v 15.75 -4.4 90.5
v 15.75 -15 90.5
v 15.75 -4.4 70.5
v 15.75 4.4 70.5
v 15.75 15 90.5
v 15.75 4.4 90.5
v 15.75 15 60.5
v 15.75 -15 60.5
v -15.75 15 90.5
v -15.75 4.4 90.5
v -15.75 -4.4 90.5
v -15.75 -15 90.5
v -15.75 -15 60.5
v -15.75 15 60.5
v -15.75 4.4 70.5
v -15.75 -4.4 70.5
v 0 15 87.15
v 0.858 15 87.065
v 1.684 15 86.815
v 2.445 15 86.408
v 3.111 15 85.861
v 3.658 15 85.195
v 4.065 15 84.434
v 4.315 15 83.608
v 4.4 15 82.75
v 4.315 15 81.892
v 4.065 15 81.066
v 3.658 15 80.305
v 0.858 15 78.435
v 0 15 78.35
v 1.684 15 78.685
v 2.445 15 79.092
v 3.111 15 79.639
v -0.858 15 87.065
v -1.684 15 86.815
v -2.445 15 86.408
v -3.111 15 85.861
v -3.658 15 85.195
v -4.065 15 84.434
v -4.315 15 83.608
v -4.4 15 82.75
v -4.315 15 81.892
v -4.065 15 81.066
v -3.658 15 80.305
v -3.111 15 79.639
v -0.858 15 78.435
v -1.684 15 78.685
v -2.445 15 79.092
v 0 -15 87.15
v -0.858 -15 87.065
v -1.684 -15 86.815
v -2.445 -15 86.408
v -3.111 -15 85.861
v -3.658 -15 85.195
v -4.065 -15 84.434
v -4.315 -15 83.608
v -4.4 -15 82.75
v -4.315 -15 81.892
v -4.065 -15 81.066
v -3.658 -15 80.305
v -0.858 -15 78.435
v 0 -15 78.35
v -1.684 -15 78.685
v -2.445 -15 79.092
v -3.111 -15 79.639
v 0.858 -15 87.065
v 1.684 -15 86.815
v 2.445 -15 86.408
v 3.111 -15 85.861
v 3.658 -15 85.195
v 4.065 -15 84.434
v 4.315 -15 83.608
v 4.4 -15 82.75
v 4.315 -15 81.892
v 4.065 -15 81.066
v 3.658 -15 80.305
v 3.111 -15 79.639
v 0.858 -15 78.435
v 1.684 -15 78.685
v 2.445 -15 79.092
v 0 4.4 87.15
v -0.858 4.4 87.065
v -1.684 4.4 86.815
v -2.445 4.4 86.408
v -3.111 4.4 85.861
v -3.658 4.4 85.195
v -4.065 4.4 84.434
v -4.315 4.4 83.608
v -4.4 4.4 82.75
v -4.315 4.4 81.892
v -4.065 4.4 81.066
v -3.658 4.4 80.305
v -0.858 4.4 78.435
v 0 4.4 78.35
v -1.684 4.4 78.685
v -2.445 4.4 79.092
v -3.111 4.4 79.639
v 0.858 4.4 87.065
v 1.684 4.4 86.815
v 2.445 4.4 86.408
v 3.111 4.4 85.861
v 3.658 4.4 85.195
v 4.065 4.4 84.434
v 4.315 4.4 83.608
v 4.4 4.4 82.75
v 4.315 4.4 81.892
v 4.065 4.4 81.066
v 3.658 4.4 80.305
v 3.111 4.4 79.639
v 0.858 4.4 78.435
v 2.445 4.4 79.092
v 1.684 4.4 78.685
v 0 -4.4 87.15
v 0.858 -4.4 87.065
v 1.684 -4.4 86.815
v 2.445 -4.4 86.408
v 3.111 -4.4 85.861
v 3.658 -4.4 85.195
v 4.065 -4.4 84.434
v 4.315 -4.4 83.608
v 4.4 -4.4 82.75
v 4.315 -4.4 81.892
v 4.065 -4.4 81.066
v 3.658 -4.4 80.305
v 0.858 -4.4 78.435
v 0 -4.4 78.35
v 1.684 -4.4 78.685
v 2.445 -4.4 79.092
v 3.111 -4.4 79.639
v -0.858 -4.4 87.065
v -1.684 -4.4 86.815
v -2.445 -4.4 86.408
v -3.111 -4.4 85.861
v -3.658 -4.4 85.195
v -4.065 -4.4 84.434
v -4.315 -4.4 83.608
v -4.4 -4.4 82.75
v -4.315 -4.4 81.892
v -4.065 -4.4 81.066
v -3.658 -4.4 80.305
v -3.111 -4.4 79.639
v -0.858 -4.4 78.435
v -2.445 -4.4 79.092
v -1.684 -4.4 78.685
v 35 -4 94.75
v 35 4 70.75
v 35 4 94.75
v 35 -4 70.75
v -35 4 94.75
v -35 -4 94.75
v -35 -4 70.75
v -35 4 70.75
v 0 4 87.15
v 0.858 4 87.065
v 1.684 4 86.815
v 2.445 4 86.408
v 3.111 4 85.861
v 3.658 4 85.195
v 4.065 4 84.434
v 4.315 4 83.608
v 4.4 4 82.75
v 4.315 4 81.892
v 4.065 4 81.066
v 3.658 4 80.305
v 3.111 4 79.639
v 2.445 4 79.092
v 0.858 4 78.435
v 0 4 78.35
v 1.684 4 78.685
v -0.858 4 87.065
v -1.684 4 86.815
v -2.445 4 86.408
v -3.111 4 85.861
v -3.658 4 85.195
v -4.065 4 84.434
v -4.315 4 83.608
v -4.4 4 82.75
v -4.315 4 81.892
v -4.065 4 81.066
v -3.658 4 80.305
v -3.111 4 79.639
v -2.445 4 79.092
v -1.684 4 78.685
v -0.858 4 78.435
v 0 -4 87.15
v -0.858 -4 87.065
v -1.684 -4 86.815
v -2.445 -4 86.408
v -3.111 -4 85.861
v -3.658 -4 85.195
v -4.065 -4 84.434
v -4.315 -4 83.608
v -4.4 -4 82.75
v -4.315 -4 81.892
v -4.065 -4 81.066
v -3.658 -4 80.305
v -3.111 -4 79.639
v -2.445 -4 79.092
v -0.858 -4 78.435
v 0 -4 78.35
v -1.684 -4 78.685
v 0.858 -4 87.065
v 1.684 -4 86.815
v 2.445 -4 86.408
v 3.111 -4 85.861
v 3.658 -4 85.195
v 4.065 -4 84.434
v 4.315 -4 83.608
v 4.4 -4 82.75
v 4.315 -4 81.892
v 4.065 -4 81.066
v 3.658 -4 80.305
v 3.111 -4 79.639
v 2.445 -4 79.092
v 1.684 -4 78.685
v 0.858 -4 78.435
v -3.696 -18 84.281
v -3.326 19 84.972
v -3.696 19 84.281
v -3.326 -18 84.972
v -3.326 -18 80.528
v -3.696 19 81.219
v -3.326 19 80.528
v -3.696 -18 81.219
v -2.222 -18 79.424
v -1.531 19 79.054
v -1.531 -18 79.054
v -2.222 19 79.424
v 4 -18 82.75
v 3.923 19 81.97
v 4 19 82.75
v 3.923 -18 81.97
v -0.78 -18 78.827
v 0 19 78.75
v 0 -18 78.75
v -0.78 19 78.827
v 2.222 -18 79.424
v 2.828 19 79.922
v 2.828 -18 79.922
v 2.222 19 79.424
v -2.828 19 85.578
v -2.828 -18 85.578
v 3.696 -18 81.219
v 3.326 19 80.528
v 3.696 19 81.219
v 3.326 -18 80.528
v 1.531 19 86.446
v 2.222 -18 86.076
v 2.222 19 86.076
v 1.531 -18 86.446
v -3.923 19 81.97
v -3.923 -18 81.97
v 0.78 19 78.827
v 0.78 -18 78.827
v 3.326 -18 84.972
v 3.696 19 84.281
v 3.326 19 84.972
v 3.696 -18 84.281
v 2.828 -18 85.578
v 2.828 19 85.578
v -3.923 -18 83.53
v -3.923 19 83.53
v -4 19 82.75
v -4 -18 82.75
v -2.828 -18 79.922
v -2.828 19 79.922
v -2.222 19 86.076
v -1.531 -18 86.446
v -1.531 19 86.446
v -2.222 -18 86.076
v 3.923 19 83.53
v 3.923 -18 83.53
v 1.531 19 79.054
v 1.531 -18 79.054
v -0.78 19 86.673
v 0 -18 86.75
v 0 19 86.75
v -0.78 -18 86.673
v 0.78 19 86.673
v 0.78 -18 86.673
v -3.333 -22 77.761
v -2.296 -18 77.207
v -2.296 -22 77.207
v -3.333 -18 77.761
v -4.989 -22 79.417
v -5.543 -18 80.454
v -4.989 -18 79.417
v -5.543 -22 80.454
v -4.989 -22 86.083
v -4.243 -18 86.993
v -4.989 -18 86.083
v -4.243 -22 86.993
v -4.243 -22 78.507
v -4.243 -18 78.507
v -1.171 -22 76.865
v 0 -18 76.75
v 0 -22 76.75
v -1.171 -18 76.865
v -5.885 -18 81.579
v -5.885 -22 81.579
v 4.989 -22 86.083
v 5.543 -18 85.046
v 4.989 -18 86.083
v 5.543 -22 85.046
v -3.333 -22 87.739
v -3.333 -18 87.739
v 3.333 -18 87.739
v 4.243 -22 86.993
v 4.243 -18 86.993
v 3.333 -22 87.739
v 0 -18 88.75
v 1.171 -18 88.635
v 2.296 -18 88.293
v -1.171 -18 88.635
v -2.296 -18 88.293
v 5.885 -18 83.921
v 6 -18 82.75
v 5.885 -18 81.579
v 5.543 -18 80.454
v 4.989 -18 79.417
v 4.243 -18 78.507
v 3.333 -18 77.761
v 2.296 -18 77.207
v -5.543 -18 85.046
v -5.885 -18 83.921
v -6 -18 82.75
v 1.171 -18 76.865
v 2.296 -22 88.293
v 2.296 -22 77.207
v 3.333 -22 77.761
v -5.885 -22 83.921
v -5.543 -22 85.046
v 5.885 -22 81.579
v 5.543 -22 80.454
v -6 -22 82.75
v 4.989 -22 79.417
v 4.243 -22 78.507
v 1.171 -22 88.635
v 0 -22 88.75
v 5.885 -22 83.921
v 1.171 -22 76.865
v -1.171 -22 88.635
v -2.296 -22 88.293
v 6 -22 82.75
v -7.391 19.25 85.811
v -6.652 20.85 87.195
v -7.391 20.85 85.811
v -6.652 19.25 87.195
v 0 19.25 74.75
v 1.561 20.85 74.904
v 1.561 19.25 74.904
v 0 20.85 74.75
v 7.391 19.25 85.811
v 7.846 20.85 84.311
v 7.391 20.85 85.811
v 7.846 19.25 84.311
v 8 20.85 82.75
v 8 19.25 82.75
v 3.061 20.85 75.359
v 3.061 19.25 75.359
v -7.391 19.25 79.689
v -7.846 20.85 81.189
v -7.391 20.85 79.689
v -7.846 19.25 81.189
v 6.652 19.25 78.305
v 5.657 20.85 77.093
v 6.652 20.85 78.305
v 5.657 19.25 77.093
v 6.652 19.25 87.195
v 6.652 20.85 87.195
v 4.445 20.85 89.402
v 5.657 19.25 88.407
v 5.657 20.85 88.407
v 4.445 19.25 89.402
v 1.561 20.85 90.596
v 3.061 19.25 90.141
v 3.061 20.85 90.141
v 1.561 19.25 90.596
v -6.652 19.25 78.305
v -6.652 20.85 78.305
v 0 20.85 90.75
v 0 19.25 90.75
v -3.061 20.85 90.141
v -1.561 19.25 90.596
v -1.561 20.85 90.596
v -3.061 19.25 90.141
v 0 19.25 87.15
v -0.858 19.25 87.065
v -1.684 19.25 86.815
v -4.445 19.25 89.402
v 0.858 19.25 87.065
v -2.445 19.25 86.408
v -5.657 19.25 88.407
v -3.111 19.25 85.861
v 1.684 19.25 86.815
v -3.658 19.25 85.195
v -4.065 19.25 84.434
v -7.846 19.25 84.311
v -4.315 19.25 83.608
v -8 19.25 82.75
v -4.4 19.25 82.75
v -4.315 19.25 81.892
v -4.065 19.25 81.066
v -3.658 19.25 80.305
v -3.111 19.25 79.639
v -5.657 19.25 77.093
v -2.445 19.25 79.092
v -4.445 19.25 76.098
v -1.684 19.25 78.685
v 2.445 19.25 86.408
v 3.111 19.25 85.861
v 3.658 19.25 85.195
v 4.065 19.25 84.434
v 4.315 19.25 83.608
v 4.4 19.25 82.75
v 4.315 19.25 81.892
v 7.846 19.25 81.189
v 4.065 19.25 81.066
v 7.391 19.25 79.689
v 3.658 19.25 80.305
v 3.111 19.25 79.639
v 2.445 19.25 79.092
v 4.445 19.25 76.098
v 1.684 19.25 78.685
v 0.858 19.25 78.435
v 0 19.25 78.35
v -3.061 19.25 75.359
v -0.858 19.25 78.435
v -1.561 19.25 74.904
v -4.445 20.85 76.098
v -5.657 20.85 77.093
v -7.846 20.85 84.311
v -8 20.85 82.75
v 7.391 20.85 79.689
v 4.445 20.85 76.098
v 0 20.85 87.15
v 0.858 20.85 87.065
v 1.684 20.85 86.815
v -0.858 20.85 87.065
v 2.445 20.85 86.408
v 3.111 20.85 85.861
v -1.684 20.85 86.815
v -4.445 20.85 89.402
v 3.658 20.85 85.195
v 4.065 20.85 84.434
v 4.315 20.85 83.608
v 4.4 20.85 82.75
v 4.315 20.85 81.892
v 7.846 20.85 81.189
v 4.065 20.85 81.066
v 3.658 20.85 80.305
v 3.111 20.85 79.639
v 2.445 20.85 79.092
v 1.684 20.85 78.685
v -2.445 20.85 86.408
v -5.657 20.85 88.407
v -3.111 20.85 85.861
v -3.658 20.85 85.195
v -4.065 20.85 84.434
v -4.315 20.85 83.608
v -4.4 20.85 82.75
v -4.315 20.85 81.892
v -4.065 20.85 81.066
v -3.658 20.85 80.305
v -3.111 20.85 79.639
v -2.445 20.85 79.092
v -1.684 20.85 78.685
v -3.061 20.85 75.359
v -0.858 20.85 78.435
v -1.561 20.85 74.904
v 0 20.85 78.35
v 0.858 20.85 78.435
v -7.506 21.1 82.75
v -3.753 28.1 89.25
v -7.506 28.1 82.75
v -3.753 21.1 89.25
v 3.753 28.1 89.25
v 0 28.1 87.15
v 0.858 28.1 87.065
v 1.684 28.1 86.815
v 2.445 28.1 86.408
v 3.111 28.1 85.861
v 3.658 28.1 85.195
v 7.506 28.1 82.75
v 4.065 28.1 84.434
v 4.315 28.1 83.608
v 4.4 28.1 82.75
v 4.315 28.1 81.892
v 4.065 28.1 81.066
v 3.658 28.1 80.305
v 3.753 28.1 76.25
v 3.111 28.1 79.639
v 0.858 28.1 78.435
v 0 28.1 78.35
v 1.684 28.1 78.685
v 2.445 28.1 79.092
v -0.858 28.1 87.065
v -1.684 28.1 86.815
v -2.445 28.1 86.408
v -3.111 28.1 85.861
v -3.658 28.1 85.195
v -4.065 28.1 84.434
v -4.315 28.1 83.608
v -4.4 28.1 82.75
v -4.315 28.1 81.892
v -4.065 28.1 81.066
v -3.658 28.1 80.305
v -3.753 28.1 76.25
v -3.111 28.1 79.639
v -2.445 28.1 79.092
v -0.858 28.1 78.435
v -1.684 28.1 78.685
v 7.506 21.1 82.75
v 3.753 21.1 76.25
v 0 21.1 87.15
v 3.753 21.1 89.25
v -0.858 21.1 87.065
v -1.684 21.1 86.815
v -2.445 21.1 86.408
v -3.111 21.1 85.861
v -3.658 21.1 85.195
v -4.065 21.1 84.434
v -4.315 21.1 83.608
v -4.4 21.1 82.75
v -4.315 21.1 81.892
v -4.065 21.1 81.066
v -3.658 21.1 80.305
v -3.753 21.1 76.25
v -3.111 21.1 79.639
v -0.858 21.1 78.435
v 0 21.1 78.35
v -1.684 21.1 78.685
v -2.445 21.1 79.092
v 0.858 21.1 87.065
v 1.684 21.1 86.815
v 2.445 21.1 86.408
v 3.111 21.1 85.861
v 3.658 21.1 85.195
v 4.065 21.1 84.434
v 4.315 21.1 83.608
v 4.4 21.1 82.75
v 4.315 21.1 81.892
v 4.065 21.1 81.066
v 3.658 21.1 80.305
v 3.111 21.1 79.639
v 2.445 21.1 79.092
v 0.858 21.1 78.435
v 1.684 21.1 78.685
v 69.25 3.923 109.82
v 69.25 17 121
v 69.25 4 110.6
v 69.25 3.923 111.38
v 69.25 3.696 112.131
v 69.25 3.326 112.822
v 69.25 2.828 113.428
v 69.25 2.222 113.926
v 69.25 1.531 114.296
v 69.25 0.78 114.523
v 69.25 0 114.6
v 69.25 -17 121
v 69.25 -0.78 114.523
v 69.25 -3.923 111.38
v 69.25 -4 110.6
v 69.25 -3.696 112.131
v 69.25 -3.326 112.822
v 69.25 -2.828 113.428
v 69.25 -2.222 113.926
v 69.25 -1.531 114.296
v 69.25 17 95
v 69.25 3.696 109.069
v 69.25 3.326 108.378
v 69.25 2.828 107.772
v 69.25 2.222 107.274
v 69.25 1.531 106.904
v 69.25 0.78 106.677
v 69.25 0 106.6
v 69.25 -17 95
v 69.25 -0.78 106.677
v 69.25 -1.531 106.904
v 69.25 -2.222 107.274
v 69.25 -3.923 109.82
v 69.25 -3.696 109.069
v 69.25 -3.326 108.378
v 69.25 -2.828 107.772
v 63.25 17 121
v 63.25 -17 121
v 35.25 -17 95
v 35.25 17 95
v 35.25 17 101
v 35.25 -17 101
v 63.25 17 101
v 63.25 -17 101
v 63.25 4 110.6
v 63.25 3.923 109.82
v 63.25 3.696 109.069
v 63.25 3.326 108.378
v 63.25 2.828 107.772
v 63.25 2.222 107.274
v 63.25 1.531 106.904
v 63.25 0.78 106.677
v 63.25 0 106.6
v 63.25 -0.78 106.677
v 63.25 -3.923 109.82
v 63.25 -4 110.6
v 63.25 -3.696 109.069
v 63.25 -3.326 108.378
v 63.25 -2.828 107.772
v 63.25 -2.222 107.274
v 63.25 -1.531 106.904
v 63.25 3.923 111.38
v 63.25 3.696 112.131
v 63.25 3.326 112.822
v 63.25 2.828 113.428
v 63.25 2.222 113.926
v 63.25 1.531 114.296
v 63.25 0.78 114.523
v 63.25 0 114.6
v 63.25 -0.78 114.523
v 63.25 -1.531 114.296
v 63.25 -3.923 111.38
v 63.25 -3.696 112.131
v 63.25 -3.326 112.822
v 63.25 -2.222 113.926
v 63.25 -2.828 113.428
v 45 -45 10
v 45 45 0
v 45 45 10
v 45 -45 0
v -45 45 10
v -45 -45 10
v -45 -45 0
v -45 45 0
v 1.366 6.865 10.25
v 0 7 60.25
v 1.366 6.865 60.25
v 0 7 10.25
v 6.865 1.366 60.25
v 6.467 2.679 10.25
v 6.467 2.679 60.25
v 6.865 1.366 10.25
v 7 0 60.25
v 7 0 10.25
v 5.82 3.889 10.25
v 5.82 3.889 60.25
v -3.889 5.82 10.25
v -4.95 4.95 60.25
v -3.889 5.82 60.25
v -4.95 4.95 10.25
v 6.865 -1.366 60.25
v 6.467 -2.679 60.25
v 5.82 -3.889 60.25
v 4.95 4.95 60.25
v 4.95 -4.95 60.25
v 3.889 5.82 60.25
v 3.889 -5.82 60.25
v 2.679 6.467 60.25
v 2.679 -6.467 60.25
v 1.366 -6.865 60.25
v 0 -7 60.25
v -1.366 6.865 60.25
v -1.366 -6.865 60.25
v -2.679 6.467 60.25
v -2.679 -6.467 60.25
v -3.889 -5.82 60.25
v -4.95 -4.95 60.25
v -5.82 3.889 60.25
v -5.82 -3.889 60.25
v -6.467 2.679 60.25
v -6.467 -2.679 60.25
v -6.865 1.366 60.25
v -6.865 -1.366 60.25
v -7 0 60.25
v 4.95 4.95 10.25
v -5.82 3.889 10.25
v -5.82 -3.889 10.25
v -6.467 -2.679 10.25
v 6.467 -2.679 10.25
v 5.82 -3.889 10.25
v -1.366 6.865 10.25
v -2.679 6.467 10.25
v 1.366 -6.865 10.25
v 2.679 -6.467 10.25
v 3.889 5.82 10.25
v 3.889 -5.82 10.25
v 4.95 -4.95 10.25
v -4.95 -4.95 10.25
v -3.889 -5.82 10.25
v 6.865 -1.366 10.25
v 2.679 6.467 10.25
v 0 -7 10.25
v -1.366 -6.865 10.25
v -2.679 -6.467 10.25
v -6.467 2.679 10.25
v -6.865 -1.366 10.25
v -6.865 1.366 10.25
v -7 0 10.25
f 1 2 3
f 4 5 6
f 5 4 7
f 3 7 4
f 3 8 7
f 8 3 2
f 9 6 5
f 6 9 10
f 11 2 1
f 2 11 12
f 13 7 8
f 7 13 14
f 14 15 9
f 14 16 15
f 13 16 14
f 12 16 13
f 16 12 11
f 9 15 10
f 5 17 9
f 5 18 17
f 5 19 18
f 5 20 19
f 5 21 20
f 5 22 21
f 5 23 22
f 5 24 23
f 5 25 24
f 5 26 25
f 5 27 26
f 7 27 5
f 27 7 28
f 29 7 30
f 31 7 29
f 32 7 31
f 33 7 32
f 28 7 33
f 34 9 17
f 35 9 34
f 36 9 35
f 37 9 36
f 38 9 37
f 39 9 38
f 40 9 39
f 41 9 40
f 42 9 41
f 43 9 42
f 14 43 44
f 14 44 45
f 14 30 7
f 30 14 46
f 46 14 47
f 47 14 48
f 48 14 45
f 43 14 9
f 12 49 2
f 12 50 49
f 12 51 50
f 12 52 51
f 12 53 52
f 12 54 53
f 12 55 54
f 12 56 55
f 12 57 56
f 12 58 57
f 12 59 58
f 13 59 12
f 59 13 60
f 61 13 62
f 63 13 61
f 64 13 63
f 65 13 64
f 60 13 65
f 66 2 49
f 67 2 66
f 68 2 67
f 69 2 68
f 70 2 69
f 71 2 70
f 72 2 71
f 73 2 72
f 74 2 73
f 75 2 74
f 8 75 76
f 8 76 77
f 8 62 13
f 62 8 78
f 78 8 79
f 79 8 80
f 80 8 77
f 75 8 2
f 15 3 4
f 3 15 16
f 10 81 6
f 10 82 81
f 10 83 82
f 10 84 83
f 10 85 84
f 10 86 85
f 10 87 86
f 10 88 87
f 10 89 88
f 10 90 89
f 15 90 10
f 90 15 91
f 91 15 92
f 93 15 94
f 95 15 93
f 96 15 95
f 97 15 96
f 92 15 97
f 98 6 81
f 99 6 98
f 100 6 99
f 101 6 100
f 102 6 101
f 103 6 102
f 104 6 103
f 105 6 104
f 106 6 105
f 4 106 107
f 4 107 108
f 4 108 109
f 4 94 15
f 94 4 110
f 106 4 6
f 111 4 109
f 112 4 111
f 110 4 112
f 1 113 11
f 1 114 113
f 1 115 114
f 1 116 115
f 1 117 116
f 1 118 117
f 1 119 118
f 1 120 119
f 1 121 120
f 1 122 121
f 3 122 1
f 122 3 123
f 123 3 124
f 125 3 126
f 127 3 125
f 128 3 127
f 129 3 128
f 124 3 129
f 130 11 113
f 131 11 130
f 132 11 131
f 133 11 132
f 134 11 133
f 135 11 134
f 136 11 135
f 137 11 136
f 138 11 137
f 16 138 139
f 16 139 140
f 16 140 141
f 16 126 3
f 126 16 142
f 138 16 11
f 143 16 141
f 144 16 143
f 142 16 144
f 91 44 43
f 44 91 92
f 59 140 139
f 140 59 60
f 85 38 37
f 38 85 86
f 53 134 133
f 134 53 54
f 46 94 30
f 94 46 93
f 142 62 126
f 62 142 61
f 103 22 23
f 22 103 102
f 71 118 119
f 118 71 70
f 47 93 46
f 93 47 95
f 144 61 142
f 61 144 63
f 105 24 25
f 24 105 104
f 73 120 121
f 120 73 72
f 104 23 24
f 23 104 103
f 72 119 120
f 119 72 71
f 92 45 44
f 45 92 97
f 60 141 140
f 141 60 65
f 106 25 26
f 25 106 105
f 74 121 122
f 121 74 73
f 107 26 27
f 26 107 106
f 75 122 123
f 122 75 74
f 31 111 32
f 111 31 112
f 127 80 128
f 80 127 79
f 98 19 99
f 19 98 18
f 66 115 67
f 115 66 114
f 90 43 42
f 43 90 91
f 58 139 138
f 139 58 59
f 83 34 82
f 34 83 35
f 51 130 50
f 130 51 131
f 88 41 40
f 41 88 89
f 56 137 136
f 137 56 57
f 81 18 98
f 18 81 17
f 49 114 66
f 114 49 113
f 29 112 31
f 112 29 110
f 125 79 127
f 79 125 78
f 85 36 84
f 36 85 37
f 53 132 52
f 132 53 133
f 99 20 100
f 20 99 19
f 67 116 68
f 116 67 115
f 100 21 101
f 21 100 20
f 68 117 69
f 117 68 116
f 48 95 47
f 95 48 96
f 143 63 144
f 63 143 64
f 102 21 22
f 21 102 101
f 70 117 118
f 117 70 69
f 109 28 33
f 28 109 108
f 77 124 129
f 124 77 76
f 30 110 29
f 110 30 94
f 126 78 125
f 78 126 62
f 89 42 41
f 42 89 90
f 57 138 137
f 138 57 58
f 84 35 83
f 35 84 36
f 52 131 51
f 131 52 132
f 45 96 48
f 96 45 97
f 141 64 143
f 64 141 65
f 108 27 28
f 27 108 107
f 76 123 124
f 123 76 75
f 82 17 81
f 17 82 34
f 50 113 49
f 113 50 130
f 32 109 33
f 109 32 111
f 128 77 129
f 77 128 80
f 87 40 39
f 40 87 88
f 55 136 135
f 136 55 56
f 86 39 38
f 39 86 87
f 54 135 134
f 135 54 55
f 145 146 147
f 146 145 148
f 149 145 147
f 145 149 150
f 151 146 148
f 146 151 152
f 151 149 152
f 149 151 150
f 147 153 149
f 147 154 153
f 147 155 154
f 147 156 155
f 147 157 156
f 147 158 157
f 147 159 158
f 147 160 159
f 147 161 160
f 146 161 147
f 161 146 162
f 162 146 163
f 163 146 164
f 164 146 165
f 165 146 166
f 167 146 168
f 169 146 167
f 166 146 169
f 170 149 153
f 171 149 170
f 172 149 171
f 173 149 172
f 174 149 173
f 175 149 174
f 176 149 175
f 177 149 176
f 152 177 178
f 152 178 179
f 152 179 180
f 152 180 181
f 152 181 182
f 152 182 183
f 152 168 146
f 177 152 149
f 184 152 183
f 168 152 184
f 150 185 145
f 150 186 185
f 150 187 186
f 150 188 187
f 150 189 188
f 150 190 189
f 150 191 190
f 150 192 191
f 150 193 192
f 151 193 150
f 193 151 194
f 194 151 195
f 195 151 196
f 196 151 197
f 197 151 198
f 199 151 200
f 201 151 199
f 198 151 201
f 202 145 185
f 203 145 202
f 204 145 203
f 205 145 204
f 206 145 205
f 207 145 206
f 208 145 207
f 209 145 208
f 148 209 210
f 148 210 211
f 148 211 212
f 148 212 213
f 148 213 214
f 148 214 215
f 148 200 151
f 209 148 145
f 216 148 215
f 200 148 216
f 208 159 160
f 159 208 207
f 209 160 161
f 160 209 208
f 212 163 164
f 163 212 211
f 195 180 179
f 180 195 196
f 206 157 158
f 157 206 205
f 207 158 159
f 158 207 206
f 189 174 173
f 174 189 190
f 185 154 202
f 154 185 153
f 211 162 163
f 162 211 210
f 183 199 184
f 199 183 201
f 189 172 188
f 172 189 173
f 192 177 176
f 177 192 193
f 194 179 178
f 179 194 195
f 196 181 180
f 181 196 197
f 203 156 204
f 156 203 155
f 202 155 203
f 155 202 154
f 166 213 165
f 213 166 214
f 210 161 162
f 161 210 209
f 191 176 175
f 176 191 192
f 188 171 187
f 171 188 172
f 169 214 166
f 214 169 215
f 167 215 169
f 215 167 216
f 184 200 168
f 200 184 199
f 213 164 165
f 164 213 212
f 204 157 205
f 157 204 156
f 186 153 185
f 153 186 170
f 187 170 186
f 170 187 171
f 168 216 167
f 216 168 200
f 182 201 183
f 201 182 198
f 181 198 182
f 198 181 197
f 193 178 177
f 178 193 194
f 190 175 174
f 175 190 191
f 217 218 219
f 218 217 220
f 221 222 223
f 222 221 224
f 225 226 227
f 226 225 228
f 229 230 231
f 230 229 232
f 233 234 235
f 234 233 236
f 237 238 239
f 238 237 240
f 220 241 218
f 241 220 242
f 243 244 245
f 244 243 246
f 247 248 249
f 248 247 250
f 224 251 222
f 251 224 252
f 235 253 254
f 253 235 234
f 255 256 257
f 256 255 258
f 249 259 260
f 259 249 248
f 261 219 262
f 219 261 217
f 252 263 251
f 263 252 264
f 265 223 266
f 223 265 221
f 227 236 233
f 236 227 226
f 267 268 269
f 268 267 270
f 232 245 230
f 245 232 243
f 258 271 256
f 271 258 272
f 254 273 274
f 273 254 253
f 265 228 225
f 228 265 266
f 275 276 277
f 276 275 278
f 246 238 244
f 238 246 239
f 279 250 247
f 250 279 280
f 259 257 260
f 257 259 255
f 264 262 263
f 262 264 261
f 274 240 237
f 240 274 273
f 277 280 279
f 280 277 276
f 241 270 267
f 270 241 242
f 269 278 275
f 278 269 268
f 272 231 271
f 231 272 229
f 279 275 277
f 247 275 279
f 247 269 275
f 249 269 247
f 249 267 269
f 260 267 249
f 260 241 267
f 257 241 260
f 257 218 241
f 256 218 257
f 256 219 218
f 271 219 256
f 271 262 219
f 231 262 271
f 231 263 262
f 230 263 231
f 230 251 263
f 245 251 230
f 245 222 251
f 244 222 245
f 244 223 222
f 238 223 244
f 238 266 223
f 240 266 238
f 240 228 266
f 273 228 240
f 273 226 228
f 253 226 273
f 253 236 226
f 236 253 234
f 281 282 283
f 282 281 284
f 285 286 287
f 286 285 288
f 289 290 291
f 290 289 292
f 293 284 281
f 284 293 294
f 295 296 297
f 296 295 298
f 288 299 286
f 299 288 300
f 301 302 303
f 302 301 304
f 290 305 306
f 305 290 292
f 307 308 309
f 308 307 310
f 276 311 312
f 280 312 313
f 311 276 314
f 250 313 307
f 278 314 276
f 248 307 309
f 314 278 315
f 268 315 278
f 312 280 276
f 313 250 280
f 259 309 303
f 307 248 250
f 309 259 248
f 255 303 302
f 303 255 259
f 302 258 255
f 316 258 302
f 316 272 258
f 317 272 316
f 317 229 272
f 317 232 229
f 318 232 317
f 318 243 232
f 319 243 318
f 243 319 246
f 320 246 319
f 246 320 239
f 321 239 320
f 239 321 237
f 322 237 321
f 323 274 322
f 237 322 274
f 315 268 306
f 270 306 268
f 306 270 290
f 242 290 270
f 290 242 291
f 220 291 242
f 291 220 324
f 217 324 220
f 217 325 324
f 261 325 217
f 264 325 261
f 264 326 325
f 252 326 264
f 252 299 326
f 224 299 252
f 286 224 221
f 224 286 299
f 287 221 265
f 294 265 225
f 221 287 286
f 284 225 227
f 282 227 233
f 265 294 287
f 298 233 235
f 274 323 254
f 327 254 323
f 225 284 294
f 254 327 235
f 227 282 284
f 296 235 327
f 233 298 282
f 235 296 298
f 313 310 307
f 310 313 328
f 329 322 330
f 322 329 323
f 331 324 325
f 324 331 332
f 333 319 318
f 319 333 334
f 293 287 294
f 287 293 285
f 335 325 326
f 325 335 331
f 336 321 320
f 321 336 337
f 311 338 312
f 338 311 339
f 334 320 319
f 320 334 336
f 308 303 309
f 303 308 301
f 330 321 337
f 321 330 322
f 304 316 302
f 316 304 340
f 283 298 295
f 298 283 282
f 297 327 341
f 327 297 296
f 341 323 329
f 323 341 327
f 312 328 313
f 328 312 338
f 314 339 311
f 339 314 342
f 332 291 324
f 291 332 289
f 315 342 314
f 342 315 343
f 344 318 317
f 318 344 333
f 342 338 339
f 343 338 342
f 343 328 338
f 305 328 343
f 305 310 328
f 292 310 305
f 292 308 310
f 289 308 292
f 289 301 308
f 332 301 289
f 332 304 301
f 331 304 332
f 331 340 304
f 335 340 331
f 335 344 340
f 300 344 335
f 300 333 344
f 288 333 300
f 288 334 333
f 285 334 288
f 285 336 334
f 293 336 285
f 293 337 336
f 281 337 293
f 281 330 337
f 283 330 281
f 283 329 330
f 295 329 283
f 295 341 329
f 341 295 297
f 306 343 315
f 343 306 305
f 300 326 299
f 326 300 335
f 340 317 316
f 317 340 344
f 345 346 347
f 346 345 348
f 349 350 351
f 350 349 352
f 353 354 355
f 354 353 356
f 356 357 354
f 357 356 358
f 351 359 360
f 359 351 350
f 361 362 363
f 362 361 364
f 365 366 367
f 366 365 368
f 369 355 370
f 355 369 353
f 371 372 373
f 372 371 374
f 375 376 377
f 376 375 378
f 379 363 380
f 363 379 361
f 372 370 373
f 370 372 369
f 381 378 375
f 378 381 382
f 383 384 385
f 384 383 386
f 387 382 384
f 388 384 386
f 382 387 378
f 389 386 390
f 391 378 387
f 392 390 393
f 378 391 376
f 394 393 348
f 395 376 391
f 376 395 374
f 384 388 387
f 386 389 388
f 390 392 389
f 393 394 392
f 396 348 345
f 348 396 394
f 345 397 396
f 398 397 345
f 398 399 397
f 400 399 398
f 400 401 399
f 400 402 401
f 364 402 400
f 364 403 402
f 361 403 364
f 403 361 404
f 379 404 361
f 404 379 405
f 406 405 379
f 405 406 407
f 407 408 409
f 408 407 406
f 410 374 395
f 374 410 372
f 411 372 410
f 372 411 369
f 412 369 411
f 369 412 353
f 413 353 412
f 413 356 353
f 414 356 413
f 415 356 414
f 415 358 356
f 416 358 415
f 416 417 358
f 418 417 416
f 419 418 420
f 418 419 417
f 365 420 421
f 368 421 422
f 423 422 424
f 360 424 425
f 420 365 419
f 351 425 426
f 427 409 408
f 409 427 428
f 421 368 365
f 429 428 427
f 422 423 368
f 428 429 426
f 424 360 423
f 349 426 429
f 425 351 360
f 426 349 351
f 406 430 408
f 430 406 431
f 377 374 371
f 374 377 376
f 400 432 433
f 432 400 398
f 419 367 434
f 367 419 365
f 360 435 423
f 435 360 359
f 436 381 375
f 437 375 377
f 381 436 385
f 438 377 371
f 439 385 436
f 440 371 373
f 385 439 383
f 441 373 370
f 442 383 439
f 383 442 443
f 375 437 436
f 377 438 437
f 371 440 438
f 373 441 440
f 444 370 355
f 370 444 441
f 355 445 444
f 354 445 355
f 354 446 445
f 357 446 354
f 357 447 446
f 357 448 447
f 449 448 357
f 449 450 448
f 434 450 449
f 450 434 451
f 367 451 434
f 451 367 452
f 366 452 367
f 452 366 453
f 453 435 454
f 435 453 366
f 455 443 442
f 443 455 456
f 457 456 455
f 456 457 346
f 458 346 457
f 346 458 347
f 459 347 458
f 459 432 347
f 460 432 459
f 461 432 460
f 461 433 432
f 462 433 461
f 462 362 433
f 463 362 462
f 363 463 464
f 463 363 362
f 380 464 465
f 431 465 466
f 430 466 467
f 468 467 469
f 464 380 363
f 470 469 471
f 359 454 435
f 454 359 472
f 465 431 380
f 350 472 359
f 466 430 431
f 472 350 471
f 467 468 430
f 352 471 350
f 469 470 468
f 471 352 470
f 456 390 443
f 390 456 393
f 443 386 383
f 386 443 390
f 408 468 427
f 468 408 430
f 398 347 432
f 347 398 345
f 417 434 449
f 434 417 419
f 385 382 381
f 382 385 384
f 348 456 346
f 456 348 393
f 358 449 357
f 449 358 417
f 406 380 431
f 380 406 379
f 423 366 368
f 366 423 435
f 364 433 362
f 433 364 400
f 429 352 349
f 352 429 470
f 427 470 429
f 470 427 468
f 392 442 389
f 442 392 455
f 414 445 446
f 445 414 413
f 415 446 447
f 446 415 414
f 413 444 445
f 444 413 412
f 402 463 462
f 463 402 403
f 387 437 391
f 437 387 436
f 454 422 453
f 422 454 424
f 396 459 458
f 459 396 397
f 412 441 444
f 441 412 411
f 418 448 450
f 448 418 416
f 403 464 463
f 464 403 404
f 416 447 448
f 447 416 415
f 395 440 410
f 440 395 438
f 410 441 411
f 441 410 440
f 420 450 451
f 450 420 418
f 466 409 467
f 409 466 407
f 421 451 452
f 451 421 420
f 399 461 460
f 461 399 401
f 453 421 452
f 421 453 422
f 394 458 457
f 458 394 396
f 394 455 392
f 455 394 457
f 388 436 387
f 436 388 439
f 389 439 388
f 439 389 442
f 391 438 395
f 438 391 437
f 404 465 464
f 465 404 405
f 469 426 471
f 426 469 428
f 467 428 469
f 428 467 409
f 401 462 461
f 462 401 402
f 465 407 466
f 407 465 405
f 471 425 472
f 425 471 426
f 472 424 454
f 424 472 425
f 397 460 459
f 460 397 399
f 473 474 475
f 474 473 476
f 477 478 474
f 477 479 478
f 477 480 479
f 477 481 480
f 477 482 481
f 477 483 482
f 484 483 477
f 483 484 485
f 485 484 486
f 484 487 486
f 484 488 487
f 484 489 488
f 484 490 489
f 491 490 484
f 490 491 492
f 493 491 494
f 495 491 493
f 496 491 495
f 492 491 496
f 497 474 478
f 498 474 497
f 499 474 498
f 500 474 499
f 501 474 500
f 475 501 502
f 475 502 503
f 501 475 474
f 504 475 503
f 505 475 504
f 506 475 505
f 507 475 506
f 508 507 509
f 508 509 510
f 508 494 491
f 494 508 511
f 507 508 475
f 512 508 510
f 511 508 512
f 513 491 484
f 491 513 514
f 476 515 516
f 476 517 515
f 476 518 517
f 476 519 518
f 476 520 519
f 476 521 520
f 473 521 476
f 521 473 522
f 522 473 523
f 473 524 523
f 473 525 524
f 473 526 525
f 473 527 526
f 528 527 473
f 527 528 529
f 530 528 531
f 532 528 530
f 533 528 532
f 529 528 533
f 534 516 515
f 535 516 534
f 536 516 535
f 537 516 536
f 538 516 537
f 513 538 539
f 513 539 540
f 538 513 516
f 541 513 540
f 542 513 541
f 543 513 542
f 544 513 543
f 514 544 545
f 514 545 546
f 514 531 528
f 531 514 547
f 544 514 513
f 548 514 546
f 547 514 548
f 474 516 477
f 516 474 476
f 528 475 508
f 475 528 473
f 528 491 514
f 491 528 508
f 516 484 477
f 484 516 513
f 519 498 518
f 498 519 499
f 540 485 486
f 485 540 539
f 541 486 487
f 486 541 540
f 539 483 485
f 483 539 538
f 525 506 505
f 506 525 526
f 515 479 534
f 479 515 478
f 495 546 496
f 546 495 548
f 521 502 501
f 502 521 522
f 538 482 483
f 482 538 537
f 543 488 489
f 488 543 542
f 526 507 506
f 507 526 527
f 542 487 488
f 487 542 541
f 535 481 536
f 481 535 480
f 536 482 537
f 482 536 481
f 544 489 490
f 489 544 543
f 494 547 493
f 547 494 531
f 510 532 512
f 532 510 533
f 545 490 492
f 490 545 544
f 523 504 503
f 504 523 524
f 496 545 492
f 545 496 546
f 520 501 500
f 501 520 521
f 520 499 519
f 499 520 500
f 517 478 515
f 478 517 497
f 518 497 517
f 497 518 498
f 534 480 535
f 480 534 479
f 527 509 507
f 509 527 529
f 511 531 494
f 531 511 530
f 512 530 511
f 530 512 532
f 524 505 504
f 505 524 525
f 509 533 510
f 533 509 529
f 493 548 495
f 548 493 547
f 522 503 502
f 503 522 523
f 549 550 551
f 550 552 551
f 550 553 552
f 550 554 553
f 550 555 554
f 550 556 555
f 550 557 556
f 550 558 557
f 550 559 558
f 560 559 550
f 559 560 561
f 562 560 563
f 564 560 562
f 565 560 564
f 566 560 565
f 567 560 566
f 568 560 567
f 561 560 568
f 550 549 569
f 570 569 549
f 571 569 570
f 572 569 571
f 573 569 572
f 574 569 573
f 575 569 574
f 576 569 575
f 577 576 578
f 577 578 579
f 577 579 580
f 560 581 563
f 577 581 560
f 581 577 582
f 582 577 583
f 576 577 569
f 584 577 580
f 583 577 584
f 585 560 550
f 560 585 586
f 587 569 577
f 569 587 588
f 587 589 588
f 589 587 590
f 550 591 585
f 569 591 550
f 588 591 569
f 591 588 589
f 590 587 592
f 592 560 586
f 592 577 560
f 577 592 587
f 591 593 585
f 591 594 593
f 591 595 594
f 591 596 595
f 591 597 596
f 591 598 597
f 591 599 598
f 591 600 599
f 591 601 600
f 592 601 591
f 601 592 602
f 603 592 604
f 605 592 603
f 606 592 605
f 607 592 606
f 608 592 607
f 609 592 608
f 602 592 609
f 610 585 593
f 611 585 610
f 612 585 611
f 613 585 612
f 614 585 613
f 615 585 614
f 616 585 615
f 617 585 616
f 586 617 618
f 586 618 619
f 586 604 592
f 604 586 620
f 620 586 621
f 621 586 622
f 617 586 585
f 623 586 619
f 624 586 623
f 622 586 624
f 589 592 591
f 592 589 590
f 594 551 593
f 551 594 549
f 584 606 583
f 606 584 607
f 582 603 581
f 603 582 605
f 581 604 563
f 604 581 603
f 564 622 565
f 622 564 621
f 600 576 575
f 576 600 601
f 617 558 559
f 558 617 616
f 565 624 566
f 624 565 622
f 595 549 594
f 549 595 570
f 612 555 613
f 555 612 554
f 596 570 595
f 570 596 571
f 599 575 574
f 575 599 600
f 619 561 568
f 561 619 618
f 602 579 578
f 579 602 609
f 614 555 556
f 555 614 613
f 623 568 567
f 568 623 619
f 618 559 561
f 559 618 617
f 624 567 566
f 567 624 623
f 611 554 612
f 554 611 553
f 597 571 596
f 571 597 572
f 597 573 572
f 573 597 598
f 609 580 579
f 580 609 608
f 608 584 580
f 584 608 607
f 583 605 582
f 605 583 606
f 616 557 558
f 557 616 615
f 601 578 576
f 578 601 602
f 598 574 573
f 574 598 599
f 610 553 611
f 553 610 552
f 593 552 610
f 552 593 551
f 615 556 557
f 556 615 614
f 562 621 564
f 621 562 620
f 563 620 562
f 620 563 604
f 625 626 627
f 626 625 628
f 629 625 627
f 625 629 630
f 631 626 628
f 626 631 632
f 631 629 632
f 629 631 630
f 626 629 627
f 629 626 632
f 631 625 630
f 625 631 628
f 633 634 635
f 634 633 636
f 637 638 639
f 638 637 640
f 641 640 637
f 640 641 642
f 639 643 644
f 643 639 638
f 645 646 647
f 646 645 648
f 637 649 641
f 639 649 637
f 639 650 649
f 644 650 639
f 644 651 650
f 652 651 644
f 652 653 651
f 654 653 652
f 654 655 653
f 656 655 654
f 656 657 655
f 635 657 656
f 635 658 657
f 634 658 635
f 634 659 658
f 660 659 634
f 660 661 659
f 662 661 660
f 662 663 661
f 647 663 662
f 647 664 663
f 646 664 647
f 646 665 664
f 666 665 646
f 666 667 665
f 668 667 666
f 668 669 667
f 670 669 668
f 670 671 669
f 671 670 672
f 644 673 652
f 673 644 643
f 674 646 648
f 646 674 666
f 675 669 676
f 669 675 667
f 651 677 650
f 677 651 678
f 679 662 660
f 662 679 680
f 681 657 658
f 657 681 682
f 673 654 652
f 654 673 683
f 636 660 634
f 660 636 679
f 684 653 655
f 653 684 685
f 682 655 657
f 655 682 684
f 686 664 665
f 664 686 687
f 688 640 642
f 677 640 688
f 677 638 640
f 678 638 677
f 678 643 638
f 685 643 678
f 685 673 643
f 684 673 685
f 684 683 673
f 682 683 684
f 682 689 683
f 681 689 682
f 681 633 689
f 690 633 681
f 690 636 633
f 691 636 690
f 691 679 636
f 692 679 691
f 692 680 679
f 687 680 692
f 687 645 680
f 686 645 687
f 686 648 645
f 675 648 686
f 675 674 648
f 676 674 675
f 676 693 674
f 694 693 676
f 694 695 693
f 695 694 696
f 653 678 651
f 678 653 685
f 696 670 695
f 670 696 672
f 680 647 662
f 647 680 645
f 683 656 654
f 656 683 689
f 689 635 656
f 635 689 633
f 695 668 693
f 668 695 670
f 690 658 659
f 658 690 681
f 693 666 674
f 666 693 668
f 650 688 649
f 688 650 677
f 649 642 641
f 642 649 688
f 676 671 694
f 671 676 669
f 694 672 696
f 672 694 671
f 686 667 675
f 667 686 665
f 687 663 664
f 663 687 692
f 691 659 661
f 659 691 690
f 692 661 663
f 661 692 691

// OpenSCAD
$fn = 32;

// ------------------------------------------------------------------------
// Lamp arm: column d14 x 50 mm, arm 70 mm
// Every part is its own module, assembly() places every instance.
// ------------------------------------------------------------------------

// --- part 1 ---
module lamp_base() {
  difference() {
    translate([-45, -45, 0]) cube([90, 90, 10]);
  }
}

// --- part 2 ---
module lamp_column() {
  cylinder(h = 50, d = 14);
}

// --- part 3 ---
module head_fork() {
  difference() {
    translate([-15.75, -15, 0]) cube([31.5, 30, 30]);
    translate([-16.75, -4.4, 10]) cube([33.5, 8.8, 21]);
    translate([0, 0, 22.25]) rotate([90, 0, 0]) cylinder(h = 32, d = 8.8, center = true);
  }
}

// --- part 4 ---
module lamp_arm() {
  difference() {
    translate([-35, -4, 0]) cube([70, 8, 24]);
    translate([0, 0, 12]) rotate([90, 0, 0]) cylinder(h = 10, d = 8.8, center = true);
  }
}

// --- part 5 ---
module arm_pin() {
  rotate([0, 90, 0]) cylinder(h = 38, d = 8, center = true);
  translate([-22, 0, 0]) rotate([0, 90, 0]) cylinder(h = 4, d = 12);
}

// --- part 6 ---
module arm_washer() {
  difference() {
      translate([0, 0, 0]) cylinder(h = 1.6, d = 16);
      translate([0, 0, -1]) cylinder(h = 3.6, d = 8.8);
    }
}

// --- part 7 ---
module arm_nut() {
  difference() {
    linear_extrude(height = 7) polygon(points = [[7.506, 0], [3.753, 6.5], [-3.753, 6.5], [-7.506, 0], [-3.753, -6.5], [3.753, -6.5]]);
    translate([0, 0, -1]) cylinder(h = 9, d = 8.8);
  }
}

// --- part 8 ---
module shade_bracket() {
  difference() {
    translate([-17, -17, 0]) cube([34, 34, 26]);
    translate([-18, -18, 6]) cube([29, 36, 21]);
    translate([14, 0, 15.6]) rotate([0, 90, 0]) cylinder(h = 8, d = 8, center = true);
  }
}

// --- assembly ---
module assembly() {
  color([0.80, 0.24, 0.20]) translate([0, 0, 0]) rotate([0, 0, 0]) lamp_base();
  color([0.20, 0.45, 0.75]) translate([0, 0, 10.25]) rotate([0, 0, 0]) lamp_column();
  color([0.25, 0.62, 0.32]) translate([0, 0, 60.5]) rotate([0, 0, 0]) head_fork();
  color([0.92, 0.70, 0.18]) translate([0, 0, 70.75]) rotate([0, 0, 0]) lamp_arm();
  color([0.58, 0.35, 0.70]) translate([0, 0, 82.75]) rotate([0, 0, 90]) arm_pin();
  color([0.16, 0.66, 0.66]) translate([0, 20.85, 82.75]) rotate([90, 0, 0]) arm_washer();
  color([0.85, 0.48, 0.18]) translate([0, 28.1, 82.75]) rotate([90, 0, 0]) arm_nut();
  color([0.55, 0.60, 0.65]) translate([52.25, 0, 95]) rotate([0, 0, 0]) shade_bracket();
}

assembly();
